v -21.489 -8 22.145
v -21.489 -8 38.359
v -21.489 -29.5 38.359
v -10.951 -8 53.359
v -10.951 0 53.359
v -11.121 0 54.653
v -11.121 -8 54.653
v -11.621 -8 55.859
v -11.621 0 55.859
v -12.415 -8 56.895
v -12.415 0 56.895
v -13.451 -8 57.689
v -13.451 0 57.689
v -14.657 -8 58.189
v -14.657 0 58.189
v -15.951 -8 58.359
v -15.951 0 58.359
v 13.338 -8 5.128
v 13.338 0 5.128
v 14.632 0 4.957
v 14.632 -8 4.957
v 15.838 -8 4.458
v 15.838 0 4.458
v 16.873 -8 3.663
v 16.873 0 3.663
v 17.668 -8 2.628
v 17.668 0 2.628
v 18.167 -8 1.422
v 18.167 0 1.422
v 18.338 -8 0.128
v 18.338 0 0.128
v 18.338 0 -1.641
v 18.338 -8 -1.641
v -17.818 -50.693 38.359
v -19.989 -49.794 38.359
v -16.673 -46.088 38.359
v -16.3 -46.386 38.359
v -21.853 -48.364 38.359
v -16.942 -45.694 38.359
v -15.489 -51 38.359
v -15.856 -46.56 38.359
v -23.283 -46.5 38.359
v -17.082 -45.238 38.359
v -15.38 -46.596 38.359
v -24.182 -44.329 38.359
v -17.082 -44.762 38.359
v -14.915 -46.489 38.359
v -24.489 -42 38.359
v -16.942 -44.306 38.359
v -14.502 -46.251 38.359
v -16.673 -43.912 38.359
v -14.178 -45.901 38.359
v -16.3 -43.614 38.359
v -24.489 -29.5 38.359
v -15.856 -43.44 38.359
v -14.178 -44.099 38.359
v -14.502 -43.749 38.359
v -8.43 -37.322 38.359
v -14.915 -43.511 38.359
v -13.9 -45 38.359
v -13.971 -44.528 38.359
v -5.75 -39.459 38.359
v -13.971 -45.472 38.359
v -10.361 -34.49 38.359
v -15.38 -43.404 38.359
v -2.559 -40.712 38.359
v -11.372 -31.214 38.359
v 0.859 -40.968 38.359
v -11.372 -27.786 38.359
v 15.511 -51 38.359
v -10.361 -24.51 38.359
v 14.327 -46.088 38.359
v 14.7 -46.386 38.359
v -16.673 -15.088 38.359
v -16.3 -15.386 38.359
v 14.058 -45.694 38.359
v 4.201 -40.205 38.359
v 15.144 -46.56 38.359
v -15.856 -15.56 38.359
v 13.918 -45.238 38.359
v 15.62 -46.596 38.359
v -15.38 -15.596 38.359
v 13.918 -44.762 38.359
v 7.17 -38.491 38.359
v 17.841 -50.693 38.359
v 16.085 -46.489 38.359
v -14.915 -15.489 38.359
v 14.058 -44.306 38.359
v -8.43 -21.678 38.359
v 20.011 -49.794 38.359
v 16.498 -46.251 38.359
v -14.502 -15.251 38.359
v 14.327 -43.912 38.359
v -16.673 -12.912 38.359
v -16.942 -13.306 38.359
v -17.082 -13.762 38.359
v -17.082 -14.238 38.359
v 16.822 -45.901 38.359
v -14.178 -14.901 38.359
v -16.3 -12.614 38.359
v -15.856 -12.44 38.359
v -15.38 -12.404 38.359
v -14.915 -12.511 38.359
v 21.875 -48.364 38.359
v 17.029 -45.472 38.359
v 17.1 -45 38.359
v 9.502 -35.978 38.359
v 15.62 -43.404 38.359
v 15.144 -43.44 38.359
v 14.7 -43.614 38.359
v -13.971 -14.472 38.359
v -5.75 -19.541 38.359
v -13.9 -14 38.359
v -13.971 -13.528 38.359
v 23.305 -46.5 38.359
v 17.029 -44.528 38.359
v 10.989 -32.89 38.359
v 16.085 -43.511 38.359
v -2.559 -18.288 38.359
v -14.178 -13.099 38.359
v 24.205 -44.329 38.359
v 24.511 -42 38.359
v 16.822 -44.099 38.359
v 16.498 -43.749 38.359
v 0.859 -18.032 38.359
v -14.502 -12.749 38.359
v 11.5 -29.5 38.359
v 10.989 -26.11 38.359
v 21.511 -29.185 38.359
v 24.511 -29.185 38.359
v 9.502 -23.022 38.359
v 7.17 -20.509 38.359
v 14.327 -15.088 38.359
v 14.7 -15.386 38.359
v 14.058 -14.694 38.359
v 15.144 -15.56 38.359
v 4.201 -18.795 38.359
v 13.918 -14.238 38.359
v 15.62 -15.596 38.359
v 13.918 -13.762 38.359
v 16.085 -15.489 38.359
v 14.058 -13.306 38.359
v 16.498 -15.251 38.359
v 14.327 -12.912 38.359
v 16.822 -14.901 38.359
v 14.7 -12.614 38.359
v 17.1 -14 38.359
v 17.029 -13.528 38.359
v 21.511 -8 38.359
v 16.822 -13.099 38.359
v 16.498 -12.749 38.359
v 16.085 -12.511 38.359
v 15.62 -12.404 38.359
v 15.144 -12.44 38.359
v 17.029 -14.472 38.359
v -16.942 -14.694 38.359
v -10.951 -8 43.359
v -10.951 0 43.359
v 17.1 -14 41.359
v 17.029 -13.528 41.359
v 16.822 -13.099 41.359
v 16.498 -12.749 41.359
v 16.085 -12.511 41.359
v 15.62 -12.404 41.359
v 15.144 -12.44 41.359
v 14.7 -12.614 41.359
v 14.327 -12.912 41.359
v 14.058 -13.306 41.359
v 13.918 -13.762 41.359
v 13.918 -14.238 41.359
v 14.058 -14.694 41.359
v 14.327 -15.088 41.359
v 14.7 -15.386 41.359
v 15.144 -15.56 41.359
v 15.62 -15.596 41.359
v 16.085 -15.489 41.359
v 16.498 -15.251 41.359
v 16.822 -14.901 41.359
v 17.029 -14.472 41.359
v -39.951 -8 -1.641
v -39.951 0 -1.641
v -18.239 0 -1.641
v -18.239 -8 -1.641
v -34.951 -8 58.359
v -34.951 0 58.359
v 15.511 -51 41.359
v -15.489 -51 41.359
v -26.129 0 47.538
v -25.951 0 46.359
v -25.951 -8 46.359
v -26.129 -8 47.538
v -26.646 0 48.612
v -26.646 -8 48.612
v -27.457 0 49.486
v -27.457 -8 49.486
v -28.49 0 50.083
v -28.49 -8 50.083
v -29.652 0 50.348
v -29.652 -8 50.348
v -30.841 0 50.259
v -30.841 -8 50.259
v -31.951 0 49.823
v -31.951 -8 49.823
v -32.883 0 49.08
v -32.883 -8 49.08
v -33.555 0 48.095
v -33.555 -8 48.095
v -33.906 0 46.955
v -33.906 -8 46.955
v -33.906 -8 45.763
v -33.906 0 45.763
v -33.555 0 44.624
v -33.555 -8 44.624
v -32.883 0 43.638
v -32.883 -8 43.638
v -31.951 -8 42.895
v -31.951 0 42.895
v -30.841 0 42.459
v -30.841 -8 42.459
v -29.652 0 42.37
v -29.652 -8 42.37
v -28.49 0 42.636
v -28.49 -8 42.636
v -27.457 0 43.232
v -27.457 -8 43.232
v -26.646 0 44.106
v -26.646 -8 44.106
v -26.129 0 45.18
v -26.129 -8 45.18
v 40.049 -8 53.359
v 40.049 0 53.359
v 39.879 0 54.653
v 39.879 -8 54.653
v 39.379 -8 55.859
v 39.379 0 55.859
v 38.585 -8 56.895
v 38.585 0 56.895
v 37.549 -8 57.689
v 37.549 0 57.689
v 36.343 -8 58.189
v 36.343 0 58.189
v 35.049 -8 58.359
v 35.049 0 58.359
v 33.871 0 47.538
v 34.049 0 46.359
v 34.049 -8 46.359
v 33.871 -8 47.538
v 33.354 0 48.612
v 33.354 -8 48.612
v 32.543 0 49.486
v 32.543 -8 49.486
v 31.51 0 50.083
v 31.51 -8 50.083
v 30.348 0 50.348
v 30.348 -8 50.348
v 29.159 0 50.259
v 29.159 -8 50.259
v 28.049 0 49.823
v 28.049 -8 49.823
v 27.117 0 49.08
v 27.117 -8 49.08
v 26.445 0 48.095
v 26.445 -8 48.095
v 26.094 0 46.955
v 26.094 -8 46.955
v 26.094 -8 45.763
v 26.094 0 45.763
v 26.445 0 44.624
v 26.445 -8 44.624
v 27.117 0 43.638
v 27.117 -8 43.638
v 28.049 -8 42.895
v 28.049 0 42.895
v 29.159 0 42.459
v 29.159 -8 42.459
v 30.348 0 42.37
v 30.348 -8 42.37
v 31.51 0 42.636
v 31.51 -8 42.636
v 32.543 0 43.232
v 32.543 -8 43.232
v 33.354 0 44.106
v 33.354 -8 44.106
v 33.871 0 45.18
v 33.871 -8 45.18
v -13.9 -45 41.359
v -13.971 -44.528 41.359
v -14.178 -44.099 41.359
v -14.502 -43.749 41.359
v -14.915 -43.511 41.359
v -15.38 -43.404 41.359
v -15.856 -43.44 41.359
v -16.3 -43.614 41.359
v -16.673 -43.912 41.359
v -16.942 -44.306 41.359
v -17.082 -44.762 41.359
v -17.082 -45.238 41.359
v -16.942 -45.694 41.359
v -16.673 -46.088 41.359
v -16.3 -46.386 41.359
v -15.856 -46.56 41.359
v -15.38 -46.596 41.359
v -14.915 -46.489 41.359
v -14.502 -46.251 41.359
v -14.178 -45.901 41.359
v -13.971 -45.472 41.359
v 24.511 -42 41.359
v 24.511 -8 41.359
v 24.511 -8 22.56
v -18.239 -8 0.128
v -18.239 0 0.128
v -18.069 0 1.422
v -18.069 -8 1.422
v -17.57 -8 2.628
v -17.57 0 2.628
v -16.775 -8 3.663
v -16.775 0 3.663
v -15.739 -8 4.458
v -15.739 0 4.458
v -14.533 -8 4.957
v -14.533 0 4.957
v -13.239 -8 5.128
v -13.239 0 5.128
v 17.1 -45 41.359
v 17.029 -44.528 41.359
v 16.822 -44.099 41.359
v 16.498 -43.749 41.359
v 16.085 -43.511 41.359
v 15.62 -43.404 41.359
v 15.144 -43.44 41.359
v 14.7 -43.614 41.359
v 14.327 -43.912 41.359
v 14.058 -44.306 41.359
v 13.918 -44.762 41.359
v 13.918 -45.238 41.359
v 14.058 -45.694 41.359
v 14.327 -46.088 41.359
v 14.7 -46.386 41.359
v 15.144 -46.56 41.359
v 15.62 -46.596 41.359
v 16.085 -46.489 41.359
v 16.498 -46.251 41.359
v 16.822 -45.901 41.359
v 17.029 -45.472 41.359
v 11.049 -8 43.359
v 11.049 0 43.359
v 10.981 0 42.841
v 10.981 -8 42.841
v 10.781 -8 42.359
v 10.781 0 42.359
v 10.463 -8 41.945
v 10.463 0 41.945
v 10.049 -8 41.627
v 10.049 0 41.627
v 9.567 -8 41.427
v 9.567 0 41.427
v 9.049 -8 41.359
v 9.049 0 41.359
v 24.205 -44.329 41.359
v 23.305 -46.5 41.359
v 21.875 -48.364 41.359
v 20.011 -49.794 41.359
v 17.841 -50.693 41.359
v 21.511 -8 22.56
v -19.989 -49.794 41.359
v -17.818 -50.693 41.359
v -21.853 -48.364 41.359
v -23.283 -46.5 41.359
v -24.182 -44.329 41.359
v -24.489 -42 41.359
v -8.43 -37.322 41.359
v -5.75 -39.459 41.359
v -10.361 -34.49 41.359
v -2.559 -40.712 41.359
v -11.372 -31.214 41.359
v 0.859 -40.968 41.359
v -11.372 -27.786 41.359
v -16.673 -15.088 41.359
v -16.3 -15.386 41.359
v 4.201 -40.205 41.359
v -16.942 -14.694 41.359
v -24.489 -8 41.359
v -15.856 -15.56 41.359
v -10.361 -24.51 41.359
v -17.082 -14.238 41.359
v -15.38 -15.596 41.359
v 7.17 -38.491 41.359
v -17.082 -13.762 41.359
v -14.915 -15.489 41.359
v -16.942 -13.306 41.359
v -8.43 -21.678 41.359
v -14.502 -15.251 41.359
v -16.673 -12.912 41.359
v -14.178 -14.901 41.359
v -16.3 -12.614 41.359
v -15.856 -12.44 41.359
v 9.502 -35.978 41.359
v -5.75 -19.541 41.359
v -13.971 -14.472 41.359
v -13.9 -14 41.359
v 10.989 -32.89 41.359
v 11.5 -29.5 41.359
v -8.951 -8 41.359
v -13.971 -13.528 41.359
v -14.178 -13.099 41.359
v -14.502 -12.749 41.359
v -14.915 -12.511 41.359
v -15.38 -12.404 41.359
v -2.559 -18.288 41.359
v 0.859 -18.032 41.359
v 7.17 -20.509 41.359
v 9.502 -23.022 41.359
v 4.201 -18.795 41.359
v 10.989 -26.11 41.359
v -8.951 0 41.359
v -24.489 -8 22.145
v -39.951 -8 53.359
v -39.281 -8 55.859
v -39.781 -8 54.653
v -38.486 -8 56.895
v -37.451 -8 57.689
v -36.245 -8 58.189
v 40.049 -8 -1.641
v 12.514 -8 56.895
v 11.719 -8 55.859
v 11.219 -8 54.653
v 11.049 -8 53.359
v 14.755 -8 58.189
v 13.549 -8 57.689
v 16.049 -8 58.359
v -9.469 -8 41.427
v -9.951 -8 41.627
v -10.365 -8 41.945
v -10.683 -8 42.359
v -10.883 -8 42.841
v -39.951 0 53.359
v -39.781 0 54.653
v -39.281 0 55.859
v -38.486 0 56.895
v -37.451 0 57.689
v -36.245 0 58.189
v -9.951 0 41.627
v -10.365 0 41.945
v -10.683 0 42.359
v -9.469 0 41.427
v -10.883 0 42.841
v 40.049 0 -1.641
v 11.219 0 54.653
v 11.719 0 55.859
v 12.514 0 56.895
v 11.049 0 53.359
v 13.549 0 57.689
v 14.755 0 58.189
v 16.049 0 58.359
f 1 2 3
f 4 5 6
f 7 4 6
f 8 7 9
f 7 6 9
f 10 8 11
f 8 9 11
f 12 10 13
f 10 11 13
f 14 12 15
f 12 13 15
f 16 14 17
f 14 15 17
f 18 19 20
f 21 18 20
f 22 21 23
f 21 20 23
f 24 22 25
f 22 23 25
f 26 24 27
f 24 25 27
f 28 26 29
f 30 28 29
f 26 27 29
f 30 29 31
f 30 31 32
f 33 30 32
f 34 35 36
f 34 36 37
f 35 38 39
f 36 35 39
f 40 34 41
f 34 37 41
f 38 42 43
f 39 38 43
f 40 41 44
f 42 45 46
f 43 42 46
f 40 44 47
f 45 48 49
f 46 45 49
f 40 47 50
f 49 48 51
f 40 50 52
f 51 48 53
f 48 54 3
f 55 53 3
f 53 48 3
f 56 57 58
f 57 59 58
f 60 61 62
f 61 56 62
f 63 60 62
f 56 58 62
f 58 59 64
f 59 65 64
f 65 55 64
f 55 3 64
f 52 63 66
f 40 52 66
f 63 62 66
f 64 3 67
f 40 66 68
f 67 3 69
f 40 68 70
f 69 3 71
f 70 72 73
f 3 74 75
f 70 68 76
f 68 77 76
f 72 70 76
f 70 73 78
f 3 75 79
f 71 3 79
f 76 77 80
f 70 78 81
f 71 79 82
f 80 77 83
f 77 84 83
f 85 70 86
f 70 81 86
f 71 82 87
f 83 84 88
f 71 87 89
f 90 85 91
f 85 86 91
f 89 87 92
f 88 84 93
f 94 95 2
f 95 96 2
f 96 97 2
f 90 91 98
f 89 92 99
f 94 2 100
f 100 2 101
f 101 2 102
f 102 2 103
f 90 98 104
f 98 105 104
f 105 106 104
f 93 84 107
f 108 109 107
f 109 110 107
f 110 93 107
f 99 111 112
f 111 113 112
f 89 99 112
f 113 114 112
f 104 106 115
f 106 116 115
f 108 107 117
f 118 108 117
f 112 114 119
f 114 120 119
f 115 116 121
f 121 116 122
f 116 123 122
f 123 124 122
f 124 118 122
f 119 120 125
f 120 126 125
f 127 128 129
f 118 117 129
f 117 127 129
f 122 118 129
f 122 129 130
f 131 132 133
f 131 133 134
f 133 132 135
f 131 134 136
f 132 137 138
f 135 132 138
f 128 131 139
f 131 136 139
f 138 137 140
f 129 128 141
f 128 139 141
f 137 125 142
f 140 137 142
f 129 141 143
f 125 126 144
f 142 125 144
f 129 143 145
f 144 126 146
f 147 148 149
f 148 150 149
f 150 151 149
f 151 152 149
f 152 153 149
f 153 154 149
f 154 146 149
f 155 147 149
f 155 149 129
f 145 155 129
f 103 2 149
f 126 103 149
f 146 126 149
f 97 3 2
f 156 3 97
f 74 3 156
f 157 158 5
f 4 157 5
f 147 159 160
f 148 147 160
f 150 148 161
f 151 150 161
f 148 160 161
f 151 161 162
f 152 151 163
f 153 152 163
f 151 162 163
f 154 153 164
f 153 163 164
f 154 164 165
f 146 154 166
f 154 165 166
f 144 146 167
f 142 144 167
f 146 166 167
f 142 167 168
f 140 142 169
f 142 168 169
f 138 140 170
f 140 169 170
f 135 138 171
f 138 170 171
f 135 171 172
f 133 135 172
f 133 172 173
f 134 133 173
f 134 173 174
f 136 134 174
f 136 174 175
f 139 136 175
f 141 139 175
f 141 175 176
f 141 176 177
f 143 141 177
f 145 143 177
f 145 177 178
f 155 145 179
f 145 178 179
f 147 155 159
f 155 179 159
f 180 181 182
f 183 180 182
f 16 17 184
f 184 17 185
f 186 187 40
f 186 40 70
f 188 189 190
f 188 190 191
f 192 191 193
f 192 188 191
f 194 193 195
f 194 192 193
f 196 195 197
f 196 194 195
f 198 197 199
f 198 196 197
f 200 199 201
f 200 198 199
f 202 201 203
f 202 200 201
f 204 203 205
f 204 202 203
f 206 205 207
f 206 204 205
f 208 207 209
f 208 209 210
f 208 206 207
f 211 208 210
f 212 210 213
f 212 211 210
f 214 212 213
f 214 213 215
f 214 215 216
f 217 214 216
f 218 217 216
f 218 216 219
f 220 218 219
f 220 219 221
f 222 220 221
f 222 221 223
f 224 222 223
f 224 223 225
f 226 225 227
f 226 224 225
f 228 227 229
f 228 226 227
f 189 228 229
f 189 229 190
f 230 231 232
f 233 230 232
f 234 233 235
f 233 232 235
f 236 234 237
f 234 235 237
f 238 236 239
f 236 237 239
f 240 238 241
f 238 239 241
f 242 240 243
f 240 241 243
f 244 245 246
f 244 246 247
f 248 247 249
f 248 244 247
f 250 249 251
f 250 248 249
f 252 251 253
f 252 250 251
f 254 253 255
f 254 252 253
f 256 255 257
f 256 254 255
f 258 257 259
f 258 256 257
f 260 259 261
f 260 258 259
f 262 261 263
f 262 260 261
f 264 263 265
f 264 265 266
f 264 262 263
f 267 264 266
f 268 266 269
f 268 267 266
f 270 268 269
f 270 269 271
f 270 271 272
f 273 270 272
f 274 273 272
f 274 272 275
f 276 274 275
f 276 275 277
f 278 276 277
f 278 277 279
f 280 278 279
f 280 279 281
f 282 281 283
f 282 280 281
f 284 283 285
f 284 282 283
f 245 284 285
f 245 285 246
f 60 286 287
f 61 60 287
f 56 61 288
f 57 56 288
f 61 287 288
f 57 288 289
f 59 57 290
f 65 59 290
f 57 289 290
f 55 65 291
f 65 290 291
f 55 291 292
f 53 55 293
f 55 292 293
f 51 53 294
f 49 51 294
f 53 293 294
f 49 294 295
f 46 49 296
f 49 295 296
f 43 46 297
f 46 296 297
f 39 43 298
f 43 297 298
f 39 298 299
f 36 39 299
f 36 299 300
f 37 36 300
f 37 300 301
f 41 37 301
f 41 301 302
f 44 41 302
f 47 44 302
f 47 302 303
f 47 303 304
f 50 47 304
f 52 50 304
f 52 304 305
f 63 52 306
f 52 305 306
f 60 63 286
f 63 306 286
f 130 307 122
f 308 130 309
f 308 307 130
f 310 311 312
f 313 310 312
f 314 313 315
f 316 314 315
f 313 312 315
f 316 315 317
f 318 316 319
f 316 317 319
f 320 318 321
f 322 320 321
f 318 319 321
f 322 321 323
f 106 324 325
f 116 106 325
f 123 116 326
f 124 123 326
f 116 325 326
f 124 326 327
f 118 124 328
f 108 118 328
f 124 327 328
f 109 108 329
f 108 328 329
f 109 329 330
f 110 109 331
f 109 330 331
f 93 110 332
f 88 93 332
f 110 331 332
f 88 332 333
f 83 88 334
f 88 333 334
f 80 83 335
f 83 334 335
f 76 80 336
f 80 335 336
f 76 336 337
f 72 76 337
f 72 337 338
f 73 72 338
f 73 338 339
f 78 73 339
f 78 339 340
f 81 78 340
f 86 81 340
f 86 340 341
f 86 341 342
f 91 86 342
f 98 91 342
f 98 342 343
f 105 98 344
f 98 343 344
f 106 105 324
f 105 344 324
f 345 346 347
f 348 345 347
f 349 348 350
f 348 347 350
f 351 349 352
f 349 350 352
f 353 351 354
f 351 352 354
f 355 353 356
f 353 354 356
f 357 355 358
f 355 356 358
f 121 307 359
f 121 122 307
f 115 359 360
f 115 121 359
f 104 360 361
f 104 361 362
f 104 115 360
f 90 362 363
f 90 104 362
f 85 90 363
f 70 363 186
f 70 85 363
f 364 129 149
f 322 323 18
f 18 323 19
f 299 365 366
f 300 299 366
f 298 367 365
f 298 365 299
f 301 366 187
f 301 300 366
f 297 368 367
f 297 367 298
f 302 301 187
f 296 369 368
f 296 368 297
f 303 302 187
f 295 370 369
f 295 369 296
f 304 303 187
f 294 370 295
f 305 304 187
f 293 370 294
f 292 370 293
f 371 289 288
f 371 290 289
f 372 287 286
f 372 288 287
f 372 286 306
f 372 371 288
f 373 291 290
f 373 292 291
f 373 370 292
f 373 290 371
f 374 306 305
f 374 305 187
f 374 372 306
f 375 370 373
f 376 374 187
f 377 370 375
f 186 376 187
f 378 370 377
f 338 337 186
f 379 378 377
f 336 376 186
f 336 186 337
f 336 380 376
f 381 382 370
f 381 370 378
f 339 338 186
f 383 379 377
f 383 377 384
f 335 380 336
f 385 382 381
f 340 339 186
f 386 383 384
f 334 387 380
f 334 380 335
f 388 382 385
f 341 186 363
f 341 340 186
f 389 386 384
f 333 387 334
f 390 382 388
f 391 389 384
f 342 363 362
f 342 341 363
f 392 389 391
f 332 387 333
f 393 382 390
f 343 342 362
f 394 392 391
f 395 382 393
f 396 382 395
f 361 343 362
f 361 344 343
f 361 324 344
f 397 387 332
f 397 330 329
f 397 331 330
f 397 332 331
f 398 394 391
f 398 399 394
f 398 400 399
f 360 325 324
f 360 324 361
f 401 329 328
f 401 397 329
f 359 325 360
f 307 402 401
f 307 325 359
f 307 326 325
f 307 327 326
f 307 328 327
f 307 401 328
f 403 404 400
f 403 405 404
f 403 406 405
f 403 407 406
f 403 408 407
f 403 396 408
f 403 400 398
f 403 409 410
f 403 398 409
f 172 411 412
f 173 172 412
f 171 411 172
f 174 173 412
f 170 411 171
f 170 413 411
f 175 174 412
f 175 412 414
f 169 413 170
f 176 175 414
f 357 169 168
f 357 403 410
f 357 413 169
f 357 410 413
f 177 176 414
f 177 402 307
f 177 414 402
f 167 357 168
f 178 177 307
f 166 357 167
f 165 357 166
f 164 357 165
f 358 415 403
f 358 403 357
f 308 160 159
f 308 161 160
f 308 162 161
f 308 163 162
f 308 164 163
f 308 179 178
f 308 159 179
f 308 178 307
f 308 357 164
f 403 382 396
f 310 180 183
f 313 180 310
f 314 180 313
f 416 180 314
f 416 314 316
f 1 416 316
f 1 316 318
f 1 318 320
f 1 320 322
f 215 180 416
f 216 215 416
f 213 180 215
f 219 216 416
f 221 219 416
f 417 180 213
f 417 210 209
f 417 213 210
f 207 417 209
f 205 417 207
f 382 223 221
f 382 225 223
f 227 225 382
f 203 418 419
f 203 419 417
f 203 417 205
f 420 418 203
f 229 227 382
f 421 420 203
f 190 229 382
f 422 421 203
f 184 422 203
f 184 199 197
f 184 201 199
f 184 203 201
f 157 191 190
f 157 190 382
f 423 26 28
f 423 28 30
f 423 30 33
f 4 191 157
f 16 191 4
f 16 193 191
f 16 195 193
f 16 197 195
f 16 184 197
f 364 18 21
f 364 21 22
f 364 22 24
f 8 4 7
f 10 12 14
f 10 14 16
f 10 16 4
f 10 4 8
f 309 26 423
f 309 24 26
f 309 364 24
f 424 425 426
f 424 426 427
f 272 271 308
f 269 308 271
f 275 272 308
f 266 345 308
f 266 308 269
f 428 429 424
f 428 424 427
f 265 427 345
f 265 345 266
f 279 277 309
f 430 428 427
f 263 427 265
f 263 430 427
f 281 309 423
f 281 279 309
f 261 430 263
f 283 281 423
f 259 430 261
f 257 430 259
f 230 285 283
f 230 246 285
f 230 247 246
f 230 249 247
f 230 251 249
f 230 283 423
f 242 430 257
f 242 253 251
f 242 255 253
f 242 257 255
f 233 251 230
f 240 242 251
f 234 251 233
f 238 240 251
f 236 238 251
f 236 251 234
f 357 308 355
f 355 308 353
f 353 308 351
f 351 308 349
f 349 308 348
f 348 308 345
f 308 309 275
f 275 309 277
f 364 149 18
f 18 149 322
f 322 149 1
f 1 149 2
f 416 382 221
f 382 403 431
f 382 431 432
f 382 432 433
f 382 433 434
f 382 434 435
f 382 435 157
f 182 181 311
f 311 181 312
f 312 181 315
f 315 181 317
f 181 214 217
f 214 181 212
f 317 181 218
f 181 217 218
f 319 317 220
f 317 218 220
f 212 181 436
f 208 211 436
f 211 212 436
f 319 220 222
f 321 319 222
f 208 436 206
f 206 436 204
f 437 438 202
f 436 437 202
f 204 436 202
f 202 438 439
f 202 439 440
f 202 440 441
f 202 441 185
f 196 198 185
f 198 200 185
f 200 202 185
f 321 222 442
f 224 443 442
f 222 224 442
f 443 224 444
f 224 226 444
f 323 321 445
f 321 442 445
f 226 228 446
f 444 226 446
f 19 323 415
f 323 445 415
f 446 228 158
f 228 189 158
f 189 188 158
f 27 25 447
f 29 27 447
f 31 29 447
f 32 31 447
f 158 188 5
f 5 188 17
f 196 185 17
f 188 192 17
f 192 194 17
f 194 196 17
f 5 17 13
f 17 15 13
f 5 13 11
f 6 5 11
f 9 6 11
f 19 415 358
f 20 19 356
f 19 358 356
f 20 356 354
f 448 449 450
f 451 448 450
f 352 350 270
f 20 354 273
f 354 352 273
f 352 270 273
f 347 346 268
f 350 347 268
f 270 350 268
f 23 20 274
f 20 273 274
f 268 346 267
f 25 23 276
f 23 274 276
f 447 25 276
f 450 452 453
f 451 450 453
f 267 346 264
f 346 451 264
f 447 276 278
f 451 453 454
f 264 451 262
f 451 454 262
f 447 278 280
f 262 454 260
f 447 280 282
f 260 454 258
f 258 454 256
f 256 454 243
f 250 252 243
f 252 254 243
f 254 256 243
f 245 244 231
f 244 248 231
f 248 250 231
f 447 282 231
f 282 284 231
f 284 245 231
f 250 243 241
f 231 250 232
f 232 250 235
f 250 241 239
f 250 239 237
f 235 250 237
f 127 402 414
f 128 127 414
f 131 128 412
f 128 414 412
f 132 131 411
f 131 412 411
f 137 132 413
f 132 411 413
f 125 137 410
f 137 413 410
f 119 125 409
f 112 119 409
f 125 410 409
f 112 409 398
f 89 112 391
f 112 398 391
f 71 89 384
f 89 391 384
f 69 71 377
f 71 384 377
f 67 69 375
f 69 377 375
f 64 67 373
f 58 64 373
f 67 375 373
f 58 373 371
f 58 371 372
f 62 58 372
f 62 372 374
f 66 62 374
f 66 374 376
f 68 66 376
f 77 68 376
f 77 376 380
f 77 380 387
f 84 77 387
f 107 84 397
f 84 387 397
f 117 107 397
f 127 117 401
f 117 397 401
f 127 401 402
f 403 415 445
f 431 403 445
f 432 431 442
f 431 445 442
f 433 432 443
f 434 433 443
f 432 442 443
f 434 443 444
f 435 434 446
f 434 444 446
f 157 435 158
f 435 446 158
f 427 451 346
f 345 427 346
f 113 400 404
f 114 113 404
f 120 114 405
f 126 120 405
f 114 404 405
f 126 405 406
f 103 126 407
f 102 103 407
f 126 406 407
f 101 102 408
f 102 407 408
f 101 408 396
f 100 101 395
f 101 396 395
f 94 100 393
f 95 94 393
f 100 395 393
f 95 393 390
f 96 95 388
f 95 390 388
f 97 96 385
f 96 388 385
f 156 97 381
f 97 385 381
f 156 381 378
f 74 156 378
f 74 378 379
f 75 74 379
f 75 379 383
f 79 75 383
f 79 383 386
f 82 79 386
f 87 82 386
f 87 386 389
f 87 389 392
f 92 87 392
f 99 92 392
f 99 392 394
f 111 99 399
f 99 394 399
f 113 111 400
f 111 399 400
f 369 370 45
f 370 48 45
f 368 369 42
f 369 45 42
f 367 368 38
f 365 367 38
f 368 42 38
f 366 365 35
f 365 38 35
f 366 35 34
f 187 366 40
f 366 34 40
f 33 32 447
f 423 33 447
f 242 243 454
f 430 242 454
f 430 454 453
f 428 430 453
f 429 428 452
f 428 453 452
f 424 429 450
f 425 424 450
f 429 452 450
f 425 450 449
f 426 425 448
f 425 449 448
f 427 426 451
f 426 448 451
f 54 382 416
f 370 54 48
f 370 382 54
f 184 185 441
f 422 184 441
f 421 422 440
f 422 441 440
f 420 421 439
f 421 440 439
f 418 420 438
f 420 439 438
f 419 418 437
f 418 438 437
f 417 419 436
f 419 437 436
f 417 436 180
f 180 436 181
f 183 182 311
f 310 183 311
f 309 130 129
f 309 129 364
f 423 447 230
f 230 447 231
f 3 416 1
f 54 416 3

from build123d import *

# Parameters (mm, degrees)
F0_R     = 5
F0_R_2   = 4
F1_DEPTH = 8
F2_W     = 49
F2_H     = 43
F2_R     = 1.6
F2_R_2   = 11.5
F3_DEPTH = 3
F5_DEPTH = 3
F6_R     = 9
F8_DEPTH = 3
F9_DEPTH = 8


# Not quite as in the source:
# - a feature of the source that left no trace in its solid (it failed there, or was rolled back) is left out


with BuildPart() as f1:
    # F0 (on Front) → F1 (new body)
    with BuildSketch(Plane.XZ):
        with BuildLine():
            Line((-15.9509392173, 58.3590910856), (-34.9509392173, 58.3590910856))
            ThreePointArc((-34.9509392173, 58.3590910856), (-38.4864731233, 56.8946249915), (-39.9509392173, 53.3590910856))
            Line((-39.9509392173, 53.3590910856), (-39.9509392173, -1.6409089144))
            Line((-39.9509392173, -1.6409089144), (-18.2393845171, -1.6409089144))
            Line((-18.2393845171, -1.6409089144), (-18.2393845171, 0.1278397727))
            ThreePointArc((-18.2393845171, 0.1278397727), (-16.774918423, 3.6633736787), (-13.2393845171, 5.1278397727))
            Line((-13.2393845171, 5.1278397727), (13.3375060824, 5.1278397727))
            ThreePointArc((13.3375060824, 5.1278397727), (16.8730399883, 3.6633736787), (18.3375060824, 0.1278397727))
            Line((18.3375060824, 0.1278397727), (18.3375060824, -1.6409089144))
            Line((18.3375060824, -1.6409089144), (40.0490607827, -1.6409089144))
            Line((40.0490607827, -1.6409089144), (40.0490607827, 53.3590910856))
            ThreePointArc((40.0490607827, 53.3590910856), (38.5845946886, 56.8946249915), (35.0490607827, 58.3590910856))
            Line((35.0490607827, 58.3590910856), (16.0490607827, 58.3590910856))
            ThreePointArc((16.0490607827, 58.3590910856), (12.5135268767, 56.8946249915), (11.0490607827, 53.3590910856))
            Line((11.0490607827, 53.3590910856), (11.0490607827, 43.3590910856))
            ThreePointArc((11.0490607827, 43.3590910856), (10.463274345, 41.9448775232), (9.0490607827, 41.3590910856))
            Line((9.0490607827, 41.3590910856), (-8.9509392173, 41.3590910856))
            ThreePointArc((-8.9509392173, 41.3590910856), (-10.3651527797, 41.9448775232), (-10.9509392173, 43.3590910856))
            Line((-10.9509392173, 43.3590910856), (-10.9509392173, 53.3590910856))
            ThreePointArc((-10.9509392173, 53.3590910856), (-12.4154053114, 56.8946249915), (-15.9509392173, 58.3590910856))
        make_face()
        with Locations((-29.9509392173, 10.3590910856)):
            Circle(F0_R, mode=Mode.SUBTRACT)
        with Locations((30.0490607827, 10.3590910856)):
            Circle(F0_R, mode=Mode.SUBTRACT)
        with Locations((-29.9509392173, 46.3590910856)):
            Circle(F0_R_2, mode=Mode.SUBTRACT)
        with Locations((30.0490607827, 46.3590910856)):
            Circle(F0_R_2, mode=Mode.SUBTRACT)
    extrude(amount=F1_DEPTH)

    # F2 (on face) → F3 (join)
    with BuildSketch(Plane.XY.offset(41.3590910856)):
        with Locations((0.0111820996, -29.5)):
            Rectangle(F2_W, F2_H)
        with Locations((-15.5, -45)):
            Circle(F2_R, mode=Mode.SUBTRACT)
        with Locations((15.5, -45)):
            Circle(F2_R, mode=Mode.SUBTRACT)
        with Locations((0, -29.5)):
            Circle(F2_R_2, mode=Mode.SUBTRACT)
        with Locations((-15.5, -14)):
            Circle(F2_R, mode=Mode.SUBTRACT)
        with Locations((15.5, -14)):
            Circle(F2_R, mode=Mode.SUBTRACT)
    extrude(amount=-F3_DEPTH)

    # F4 (on face) → F5 (join)
    with BuildSketch(Plane(origin=(-24.4888179004, 0, 0), x_dir=(0, -1, 0), z_dir=(-1, 0, 0))):
        Polygon((29.5, 38.3590910856), (8, 38.3590910856), (7.8833866864, 22.056709975), align=None)
    extrude(amount=-F5_DEPTH)

    # F6
    f6_edges = [f1.edges().sort_by_distance(p)[0] for p in [
        (-24.488818, -51, 39.859091),
        (24.511182, -51, 39.859091),
    ]]
    fillet(f6_edges, radius=F6_R)

    # F7 (on face) → F8 (join)
    with BuildSketch(Plane.YZ.offset(24.5111820996)):
        Polygon((-8, 38.3590910856), (-29.1853044182, 38.3590910856), (-8, 22.5599054247), align=None)
    extrude(amount=-F8_DEPTH)

    # F0 (on Front) → F9 (join)
    with BuildSketch(Plane.XZ):
        with Locations((30.0490607827, 10.3590910856)):
            Circle(F0_R)
        with Locations((-29.9509392173, 10.3590910856)):
            Circle(F0_R)
    extrude(amount=F9_DEPTH)


with BuildPart() as f10_1:
    # F10: copy of F1
    add(f1.part)


solid = f1.part
